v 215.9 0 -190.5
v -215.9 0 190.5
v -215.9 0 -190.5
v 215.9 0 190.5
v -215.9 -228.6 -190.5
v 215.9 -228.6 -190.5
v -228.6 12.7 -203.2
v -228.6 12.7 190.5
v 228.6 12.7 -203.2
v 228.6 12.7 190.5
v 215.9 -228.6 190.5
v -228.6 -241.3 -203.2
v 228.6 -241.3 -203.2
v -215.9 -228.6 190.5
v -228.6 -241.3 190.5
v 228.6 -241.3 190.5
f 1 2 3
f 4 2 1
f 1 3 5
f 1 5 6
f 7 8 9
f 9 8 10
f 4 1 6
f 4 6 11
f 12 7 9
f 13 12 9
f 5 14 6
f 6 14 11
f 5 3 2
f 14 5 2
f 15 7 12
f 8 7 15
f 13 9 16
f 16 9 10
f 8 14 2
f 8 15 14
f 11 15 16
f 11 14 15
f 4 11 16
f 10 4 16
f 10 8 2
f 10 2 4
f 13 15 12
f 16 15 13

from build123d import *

# Parameters (mm, degrees)
F0_W     = 431.8
F0_H     = 381
F1_DEPTH = 228.6
F2_T     = 12.7


with BuildPart() as f1:
    # F0 (on Front) → F1 (new body)
    with BuildSketch(Plane.XZ):
        Rectangle(F0_W, F0_H)
    extrude(amount=F1_DEPTH)

    # F2
    f2_openings = [f1.faces().sort_by_distance(p)[0] for p in [
        (0, -114.3, 190.5),
    ]]
    offset(amount=F2_T, openings=f2_openings, kind=Kind.INTERSECTION)


solid = f1.part
